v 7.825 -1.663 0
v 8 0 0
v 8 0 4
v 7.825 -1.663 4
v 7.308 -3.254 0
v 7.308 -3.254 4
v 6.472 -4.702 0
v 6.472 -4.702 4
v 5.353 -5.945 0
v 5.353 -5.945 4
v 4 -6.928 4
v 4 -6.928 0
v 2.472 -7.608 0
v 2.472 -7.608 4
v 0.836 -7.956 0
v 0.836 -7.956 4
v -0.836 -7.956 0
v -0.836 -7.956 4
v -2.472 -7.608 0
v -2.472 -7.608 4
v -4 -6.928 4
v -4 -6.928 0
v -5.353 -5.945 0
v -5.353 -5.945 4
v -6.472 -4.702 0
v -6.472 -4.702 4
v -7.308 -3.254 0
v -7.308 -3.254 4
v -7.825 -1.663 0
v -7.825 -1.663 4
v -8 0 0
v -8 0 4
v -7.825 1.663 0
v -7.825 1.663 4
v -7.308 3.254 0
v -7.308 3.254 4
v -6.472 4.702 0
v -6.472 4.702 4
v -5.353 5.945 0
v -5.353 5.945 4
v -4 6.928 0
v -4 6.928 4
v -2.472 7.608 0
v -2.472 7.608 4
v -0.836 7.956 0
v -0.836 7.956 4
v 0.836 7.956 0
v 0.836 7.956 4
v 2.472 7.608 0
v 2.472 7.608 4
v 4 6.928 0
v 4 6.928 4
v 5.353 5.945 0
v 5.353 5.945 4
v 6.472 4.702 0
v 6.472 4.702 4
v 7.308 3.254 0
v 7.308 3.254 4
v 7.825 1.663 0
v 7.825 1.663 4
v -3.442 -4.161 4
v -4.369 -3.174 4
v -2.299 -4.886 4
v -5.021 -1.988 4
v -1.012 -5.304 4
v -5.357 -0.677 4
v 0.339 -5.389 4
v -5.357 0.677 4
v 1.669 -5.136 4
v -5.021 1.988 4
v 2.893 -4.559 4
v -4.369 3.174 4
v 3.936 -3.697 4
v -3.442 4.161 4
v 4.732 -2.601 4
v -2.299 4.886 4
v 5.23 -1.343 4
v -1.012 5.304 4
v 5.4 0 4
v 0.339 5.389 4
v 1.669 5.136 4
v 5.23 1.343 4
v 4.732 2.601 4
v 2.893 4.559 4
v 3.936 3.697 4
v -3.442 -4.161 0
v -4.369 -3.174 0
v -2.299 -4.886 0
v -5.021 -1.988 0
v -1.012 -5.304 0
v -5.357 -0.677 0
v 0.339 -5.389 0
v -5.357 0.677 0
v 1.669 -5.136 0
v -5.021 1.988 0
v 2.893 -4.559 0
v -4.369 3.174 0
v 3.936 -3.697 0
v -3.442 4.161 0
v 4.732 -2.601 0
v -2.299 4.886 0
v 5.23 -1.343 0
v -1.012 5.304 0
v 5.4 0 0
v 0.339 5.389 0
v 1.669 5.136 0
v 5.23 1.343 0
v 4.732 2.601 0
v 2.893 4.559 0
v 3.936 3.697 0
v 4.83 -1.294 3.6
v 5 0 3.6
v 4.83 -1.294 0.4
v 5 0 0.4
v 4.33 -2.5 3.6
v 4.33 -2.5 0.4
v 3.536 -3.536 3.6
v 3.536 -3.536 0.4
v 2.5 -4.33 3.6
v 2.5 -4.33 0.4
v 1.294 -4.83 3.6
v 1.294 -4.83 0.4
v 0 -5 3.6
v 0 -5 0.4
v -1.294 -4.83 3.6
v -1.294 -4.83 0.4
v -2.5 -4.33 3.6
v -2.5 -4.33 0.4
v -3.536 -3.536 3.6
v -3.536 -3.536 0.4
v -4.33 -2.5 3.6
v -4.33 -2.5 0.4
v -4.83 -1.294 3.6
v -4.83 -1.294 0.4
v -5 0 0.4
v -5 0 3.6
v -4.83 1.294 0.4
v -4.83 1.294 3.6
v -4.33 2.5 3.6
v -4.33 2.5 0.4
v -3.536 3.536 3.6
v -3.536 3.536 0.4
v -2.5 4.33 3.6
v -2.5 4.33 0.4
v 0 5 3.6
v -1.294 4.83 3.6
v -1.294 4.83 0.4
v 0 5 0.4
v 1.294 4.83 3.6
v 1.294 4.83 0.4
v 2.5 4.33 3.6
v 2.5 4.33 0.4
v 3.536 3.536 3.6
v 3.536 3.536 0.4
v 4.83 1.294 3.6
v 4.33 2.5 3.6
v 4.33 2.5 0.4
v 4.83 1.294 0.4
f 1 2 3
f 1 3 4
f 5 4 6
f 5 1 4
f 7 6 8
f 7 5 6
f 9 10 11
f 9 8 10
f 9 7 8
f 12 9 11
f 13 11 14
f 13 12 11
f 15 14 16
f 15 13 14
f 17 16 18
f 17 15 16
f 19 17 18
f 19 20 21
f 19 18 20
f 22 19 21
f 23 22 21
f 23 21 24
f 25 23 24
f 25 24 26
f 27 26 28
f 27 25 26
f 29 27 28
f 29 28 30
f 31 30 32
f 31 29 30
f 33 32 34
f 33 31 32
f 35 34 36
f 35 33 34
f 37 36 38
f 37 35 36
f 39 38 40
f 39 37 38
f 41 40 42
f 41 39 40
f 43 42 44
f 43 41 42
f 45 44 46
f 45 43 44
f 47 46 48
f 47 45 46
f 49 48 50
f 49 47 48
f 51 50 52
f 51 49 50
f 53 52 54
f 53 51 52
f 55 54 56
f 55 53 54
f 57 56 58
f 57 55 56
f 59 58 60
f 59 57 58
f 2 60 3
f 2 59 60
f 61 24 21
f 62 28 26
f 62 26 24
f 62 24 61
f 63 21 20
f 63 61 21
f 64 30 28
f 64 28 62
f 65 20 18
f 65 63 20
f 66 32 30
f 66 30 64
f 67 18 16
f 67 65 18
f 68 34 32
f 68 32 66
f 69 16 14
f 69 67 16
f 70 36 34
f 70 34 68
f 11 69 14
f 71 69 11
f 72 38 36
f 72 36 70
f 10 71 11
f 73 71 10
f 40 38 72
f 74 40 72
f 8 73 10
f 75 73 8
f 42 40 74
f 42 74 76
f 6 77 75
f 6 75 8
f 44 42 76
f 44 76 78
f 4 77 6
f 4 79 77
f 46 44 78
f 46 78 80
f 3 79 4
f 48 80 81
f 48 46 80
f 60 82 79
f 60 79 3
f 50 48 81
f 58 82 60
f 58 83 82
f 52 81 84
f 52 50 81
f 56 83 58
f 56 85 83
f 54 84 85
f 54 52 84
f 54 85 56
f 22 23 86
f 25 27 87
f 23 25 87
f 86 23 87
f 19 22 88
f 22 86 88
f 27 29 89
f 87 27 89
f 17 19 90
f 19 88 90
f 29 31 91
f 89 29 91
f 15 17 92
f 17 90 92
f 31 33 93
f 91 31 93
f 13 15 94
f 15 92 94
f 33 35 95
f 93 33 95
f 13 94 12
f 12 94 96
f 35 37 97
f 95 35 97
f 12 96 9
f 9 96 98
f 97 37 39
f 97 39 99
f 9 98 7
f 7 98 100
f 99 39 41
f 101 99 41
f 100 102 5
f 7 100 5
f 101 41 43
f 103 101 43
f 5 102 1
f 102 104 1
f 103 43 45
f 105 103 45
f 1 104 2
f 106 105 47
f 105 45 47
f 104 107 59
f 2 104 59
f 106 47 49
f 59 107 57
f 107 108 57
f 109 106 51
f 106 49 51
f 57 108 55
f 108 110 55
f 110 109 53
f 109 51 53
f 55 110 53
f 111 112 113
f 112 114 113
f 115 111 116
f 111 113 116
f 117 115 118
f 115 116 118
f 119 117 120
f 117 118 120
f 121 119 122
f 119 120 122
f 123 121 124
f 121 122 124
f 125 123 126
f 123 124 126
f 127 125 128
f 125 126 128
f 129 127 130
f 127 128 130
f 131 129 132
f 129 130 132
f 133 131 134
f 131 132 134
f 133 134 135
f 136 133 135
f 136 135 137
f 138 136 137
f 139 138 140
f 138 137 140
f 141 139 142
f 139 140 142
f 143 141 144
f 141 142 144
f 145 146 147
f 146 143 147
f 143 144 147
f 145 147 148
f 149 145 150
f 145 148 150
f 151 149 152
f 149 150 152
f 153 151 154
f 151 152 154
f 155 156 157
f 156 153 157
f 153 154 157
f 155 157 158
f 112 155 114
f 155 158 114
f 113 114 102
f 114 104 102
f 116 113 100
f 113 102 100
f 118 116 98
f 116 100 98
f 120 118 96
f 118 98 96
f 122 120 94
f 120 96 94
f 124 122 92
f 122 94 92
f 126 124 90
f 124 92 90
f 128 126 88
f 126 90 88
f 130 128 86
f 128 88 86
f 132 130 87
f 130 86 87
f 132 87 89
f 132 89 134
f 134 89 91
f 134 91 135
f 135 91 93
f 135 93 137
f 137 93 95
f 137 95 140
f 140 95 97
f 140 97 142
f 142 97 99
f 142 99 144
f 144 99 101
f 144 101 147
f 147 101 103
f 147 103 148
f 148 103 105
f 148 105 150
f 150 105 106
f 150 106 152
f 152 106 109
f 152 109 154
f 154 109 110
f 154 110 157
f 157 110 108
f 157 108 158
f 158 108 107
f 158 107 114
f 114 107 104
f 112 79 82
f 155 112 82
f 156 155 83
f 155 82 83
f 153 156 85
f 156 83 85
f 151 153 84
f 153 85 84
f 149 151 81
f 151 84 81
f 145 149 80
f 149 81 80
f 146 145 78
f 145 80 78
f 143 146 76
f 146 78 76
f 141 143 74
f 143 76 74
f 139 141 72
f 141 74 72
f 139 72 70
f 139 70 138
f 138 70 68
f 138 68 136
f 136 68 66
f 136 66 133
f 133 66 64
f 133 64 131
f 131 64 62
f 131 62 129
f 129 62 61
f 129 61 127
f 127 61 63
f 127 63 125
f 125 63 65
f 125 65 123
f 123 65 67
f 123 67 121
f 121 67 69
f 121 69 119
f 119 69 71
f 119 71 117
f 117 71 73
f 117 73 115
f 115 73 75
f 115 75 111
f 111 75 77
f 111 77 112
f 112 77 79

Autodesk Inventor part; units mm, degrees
ref_plane "YZ Plane" through (0, 0, 0) normal (1, 0, 0) x (0, 1, 0)
ref_plane "XZ Plane" through (0, 0, 0) normal (0, 1, 0) x (-1, 0, 0)
ref_plane "XY Plane" through (0, 0, 0) normal (0, 0, 1) x (1, 0, 0)
sketch "Sketch1" plane through (0, 0, 0) normal (0, 0, 1) x (1, 0, 0)
  circle A0 centre (0, 0) radius 5
  circle A1 centre (0, 0) radius 8
  dimension "d0" = 10
  dimension "d1" = 16
extrude "Extrusion1" add sketch "Sketch1" along normal blind 4
thread "Thread1" size "M10x1.5" class "6H" standard "ANSI Metric M Profile" length 5.5
chamfer "Chamfer1" distance 0.4 angle 45 1 edges at (-5, 0, 4)
chamfer "Chamfer2" distance 0.4 angle 45 1 edges at (-5, 0, 0)
properties part number "nakretka-GM"
